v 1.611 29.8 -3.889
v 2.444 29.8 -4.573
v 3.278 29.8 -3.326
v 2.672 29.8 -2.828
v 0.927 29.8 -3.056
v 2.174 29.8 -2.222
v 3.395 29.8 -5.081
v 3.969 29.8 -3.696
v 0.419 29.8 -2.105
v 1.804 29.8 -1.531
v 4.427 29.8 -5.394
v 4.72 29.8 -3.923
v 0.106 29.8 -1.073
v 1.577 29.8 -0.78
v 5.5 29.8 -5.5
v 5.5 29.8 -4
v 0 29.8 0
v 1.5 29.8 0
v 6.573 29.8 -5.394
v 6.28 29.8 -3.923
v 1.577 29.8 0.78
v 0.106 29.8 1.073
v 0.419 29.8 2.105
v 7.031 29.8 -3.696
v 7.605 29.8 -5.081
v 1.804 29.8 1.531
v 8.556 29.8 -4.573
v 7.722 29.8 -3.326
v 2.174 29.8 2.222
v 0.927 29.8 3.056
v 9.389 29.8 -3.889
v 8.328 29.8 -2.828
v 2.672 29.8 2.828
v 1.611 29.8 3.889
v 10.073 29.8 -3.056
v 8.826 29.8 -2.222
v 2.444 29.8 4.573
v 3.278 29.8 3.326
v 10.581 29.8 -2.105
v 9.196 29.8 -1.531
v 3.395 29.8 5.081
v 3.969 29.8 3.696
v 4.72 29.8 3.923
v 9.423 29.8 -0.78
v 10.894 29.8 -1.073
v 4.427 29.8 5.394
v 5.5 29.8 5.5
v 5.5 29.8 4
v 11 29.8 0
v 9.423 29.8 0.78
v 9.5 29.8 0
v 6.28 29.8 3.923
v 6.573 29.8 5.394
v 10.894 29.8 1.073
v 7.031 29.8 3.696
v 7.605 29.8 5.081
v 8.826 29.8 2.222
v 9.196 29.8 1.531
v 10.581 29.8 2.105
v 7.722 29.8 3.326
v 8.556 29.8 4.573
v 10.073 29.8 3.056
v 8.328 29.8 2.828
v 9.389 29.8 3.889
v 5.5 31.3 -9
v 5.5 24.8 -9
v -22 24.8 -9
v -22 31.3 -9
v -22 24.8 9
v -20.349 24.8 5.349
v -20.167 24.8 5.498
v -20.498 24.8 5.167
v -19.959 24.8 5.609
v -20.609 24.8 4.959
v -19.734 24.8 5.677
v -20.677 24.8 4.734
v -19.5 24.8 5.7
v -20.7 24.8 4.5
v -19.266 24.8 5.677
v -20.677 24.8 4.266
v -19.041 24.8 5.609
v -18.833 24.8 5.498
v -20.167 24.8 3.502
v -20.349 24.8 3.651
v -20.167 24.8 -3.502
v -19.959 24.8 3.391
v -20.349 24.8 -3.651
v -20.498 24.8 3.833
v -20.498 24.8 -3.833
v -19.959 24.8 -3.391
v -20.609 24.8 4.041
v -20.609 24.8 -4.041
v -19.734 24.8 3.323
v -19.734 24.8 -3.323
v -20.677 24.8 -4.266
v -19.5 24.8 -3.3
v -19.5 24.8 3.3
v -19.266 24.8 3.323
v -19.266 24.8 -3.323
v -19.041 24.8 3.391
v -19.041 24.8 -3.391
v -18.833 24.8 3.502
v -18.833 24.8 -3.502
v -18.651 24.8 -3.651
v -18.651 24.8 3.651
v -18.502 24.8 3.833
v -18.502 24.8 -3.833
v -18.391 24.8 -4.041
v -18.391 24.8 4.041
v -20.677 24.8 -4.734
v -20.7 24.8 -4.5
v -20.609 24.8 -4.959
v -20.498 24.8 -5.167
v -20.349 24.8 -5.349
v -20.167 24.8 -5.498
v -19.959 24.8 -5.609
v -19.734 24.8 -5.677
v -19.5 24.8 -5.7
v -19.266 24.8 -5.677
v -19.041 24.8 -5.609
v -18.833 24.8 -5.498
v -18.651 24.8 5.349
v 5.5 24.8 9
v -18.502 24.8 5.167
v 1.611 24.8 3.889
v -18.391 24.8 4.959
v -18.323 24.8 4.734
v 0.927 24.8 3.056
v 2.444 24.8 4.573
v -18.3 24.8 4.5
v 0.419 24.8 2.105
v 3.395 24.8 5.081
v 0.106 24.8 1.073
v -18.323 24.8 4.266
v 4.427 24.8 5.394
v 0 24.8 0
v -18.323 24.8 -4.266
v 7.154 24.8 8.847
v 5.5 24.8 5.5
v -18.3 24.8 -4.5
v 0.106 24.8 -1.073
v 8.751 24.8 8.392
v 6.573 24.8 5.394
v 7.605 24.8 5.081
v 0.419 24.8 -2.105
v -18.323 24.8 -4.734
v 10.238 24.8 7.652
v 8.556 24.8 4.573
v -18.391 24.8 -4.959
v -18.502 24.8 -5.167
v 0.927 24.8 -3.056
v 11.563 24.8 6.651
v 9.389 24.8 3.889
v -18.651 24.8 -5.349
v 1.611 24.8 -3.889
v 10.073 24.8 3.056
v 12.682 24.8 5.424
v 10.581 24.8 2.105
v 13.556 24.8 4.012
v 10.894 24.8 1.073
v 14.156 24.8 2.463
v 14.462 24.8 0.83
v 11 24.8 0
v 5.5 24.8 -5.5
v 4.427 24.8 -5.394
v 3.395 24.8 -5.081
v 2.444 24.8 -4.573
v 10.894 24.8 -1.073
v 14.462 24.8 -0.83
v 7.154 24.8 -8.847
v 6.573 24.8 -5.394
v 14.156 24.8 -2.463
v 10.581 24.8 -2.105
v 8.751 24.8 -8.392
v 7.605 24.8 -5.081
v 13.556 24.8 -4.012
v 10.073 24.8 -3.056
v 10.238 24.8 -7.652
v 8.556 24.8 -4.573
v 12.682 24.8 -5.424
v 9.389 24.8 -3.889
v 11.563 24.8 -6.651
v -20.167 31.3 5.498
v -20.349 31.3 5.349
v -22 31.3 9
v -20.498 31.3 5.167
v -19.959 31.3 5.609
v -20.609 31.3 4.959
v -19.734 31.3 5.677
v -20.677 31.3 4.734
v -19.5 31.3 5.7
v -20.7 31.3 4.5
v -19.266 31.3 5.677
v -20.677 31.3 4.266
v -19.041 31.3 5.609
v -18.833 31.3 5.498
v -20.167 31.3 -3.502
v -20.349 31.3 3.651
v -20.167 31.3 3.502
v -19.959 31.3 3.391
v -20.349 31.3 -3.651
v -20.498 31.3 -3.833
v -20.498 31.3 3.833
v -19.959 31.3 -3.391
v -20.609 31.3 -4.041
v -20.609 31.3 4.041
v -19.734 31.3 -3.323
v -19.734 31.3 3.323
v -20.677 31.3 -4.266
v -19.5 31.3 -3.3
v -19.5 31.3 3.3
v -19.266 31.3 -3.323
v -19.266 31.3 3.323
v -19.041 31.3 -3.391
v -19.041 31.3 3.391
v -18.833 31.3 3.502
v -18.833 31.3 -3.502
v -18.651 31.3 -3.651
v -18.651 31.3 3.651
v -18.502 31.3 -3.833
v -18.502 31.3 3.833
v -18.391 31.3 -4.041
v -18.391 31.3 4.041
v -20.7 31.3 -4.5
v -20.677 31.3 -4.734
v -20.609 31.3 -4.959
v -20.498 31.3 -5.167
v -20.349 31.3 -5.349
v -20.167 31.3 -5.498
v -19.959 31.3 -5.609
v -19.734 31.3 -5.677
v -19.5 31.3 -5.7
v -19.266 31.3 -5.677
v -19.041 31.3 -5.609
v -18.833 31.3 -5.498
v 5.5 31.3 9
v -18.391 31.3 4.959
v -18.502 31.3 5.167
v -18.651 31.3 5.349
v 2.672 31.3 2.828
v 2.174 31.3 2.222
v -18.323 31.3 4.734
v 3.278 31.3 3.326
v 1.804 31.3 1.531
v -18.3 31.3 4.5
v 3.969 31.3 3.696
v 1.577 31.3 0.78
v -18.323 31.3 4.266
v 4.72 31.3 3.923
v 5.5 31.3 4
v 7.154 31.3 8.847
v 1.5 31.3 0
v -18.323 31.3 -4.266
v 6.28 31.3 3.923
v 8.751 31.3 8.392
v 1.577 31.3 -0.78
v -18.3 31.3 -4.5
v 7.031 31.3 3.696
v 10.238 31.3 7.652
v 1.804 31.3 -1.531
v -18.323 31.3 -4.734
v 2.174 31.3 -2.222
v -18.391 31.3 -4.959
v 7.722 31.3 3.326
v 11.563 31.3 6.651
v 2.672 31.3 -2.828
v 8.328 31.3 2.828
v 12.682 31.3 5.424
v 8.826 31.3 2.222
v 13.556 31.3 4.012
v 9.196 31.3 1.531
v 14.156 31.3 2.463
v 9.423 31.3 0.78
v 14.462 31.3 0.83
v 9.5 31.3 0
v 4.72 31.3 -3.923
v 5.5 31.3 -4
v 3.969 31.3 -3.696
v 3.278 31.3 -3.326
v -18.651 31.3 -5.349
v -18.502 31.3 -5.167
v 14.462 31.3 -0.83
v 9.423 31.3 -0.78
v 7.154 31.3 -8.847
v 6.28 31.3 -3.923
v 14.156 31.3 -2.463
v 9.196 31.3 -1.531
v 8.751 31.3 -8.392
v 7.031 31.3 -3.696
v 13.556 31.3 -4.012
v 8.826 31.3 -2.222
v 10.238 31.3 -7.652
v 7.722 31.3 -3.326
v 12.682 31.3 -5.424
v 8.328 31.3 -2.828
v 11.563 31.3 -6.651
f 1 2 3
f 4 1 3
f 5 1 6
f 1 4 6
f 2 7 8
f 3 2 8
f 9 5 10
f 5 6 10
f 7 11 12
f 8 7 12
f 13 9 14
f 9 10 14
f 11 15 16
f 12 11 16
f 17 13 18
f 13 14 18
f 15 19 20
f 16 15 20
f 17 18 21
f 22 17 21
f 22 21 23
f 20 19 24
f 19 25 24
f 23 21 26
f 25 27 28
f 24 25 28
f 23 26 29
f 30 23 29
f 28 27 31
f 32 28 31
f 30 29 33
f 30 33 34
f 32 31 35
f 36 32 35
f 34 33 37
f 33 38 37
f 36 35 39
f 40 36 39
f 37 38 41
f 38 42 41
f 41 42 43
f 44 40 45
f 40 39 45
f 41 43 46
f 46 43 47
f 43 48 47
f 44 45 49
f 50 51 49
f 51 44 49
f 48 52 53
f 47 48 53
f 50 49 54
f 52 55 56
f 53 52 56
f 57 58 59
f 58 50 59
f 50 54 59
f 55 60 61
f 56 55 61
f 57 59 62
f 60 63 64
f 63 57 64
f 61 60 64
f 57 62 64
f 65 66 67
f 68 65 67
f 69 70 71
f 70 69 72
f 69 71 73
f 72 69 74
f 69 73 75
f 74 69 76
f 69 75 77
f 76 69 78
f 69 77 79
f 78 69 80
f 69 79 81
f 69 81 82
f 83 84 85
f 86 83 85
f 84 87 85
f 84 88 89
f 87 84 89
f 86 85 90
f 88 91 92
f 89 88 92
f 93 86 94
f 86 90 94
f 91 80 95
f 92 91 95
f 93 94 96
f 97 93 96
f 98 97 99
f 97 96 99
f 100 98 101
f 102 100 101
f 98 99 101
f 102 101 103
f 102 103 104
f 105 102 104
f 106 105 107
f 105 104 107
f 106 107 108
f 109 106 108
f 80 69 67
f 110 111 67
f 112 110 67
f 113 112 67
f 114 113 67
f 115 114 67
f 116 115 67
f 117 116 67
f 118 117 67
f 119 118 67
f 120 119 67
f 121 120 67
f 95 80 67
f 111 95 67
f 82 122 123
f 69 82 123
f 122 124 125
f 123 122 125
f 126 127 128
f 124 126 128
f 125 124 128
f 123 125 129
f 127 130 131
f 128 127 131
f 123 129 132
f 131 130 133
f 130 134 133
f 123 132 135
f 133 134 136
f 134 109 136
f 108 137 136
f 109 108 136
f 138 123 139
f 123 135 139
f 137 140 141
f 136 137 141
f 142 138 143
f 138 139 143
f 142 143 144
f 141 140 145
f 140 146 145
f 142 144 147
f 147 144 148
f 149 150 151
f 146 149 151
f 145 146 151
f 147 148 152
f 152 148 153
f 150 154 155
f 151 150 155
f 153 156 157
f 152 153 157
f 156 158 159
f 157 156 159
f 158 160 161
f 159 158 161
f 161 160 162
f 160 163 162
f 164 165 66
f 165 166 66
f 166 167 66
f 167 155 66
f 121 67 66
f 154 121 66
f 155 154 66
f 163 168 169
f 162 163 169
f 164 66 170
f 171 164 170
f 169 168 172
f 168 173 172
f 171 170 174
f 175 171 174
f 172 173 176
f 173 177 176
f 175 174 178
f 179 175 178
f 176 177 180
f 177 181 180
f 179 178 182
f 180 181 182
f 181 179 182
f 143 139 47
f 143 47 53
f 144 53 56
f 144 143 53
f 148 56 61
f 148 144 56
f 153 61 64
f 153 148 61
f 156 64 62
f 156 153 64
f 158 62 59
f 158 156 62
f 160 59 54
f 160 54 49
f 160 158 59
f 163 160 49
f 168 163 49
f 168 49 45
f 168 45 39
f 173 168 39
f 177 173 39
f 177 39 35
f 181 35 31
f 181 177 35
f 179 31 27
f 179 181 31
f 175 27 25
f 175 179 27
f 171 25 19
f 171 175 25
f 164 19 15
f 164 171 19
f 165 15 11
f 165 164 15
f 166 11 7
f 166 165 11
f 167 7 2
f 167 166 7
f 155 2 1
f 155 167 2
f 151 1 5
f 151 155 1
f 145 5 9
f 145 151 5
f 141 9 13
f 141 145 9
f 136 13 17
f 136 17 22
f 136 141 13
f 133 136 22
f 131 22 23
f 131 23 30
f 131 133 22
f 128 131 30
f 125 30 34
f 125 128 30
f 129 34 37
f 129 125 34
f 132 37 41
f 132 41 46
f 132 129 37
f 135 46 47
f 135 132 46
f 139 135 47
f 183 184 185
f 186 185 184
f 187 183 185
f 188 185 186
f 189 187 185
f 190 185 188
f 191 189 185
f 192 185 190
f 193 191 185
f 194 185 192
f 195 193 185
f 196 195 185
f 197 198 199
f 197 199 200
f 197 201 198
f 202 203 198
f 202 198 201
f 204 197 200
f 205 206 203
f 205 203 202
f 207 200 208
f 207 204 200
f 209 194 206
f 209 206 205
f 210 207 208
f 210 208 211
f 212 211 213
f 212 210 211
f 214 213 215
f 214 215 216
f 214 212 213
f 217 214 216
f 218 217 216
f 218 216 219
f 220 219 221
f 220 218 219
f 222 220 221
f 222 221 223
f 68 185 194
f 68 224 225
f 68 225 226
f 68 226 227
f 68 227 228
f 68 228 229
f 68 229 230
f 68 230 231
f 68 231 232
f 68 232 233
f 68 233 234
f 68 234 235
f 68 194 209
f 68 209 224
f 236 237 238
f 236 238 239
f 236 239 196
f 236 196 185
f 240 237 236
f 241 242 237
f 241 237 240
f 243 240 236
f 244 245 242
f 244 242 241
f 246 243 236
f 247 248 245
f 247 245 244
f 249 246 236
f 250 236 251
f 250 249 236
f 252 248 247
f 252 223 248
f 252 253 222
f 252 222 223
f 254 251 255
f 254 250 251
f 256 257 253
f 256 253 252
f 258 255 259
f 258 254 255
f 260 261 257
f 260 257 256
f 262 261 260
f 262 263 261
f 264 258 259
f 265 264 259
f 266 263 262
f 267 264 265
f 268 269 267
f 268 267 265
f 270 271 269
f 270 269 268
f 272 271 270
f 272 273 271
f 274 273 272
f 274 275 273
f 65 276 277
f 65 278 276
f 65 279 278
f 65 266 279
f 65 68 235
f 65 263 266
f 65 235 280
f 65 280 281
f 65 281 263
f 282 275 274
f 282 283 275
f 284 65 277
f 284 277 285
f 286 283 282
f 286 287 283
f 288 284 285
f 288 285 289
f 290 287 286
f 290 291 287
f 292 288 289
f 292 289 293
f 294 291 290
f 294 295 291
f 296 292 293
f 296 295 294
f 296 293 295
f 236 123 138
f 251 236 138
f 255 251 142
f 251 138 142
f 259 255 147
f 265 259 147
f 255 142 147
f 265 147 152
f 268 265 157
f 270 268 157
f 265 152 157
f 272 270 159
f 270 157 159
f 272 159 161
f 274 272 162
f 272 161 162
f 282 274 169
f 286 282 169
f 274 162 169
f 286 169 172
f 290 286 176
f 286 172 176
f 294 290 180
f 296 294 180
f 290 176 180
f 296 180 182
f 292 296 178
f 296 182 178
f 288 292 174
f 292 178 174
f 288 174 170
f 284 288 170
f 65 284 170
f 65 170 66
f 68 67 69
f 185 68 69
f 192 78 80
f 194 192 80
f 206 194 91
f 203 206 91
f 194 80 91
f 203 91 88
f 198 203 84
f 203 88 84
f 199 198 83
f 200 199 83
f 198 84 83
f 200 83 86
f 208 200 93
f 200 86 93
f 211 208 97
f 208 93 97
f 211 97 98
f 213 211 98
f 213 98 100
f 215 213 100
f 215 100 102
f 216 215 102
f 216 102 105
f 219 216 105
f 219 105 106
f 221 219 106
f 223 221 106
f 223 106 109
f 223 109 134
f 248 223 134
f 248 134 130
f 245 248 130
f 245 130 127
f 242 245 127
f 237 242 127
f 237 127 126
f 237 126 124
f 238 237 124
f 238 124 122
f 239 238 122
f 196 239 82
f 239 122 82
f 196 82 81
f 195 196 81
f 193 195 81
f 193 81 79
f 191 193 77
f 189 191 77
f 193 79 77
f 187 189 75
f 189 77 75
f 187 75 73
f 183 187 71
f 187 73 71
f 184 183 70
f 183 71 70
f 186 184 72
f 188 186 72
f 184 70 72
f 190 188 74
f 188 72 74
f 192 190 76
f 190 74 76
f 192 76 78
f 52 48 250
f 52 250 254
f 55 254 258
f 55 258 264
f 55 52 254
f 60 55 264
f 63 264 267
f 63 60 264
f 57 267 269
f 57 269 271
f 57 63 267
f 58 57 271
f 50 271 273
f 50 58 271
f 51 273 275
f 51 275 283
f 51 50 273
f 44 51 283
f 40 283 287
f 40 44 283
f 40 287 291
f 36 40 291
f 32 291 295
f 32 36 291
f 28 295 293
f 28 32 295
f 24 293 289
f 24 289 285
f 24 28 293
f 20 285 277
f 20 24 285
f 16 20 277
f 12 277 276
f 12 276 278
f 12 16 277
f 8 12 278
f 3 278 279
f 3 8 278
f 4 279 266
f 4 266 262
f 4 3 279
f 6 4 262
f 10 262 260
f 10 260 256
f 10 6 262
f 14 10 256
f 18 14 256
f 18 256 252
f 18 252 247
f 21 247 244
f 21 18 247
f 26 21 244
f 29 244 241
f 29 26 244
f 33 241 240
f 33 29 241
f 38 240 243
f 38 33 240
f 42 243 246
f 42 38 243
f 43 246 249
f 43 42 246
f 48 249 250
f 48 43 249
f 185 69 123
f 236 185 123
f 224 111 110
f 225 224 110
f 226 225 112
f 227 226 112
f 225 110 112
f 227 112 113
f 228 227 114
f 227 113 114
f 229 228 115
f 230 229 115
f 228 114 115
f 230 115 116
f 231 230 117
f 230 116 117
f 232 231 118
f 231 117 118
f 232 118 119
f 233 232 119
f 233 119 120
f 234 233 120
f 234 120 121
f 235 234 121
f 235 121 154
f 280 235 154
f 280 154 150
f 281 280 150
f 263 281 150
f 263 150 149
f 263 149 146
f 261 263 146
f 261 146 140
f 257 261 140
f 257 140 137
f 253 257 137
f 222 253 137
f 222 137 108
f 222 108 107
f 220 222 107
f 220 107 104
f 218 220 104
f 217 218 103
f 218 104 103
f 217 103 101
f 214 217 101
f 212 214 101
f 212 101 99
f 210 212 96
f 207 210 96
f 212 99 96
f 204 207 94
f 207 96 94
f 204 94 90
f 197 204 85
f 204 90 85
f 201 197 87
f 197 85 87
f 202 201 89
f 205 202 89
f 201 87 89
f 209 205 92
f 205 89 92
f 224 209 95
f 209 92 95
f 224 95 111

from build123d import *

# Parameters (mm, degrees)
BOSS_EXTRUDE1_DEPTH  = 6.5
SKETCH2_R            = 5.5
CUT_EXTRUDE2_DEPTH   = 5
SKETCH3_R            = 4
CUT_EXTRUDE4_DEPTH   = 1.5
M2_CLEARANCE_HOLE1_D = 2.4
M2_CLEARANCE_HOLE2_D = 2.4


with BuildPart() as part:
    # Sketch1 → Boss-Extrude1 (new body)
    with BuildSketch(Plane(origin=(0, 24.8, 0), x_dir=(1, 0, 0), z_dir=(0, 1, 0))):
        with BuildLine():
            Line((5.5, 9), (-22, 9))
            Line((-22, 9), (-22, -9))
            Line((-22, -9), (5.5, -9))
            ThreePointArc((5.5, -9), (14.5, 0), (5.5, 9))
        make_face()
    extrude(amount=BOSS_EXTRUDE1_DEPTH)

    # Sketch2 → Cut-Extrude2 (cut)
    with BuildSketch(Plane(origin=(0, 24.8, 0), x_dir=(1, 0, 0), z_dir=(0, 1, 0))):
        with Locations(Location((5.5, 0, 0), (0, 0, 270))):
            Circle(SKETCH2_R)
    extrude(amount=CUT_EXTRUDE2_DEPTH, mode=Mode.SUBTRACT)

    # Sketch3 → Cut-Extrude4 (cut)
    with BuildSketch(Plane(origin=(0, 29.8, 0), x_dir=(1, 0, 0), z_dir=(0, 1, 0))):
        with Locations(Location((5.5, 0, 0), (0, 0, 270))):
            Circle(SKETCH3_R)
    extrude(amount=CUT_EXTRUDE4_DEPTH, mode=Mode.SUBTRACT)

    # M2 Clearance Hole1 (through all)
    with Locations(Plane(origin=(0, 31.3, 0), x_dir=(1, 0, 0), z_dir=(0, 1, 0))):
        with Locations((-19.5, -4.5)):
            Hole(M2_CLEARANCE_HOLE1_D / 2)

    # M2 Clearance Hole2 (through all)
    with Locations(Plane(origin=(0, 31.3, 0), x_dir=(1, 0, 0), z_dir=(0, 1, 0))):
        with Locations((-19.5, 4.5)):
            Hole(M2_CLEARANCE_HOLE2_D / 2)


solid = part.part
